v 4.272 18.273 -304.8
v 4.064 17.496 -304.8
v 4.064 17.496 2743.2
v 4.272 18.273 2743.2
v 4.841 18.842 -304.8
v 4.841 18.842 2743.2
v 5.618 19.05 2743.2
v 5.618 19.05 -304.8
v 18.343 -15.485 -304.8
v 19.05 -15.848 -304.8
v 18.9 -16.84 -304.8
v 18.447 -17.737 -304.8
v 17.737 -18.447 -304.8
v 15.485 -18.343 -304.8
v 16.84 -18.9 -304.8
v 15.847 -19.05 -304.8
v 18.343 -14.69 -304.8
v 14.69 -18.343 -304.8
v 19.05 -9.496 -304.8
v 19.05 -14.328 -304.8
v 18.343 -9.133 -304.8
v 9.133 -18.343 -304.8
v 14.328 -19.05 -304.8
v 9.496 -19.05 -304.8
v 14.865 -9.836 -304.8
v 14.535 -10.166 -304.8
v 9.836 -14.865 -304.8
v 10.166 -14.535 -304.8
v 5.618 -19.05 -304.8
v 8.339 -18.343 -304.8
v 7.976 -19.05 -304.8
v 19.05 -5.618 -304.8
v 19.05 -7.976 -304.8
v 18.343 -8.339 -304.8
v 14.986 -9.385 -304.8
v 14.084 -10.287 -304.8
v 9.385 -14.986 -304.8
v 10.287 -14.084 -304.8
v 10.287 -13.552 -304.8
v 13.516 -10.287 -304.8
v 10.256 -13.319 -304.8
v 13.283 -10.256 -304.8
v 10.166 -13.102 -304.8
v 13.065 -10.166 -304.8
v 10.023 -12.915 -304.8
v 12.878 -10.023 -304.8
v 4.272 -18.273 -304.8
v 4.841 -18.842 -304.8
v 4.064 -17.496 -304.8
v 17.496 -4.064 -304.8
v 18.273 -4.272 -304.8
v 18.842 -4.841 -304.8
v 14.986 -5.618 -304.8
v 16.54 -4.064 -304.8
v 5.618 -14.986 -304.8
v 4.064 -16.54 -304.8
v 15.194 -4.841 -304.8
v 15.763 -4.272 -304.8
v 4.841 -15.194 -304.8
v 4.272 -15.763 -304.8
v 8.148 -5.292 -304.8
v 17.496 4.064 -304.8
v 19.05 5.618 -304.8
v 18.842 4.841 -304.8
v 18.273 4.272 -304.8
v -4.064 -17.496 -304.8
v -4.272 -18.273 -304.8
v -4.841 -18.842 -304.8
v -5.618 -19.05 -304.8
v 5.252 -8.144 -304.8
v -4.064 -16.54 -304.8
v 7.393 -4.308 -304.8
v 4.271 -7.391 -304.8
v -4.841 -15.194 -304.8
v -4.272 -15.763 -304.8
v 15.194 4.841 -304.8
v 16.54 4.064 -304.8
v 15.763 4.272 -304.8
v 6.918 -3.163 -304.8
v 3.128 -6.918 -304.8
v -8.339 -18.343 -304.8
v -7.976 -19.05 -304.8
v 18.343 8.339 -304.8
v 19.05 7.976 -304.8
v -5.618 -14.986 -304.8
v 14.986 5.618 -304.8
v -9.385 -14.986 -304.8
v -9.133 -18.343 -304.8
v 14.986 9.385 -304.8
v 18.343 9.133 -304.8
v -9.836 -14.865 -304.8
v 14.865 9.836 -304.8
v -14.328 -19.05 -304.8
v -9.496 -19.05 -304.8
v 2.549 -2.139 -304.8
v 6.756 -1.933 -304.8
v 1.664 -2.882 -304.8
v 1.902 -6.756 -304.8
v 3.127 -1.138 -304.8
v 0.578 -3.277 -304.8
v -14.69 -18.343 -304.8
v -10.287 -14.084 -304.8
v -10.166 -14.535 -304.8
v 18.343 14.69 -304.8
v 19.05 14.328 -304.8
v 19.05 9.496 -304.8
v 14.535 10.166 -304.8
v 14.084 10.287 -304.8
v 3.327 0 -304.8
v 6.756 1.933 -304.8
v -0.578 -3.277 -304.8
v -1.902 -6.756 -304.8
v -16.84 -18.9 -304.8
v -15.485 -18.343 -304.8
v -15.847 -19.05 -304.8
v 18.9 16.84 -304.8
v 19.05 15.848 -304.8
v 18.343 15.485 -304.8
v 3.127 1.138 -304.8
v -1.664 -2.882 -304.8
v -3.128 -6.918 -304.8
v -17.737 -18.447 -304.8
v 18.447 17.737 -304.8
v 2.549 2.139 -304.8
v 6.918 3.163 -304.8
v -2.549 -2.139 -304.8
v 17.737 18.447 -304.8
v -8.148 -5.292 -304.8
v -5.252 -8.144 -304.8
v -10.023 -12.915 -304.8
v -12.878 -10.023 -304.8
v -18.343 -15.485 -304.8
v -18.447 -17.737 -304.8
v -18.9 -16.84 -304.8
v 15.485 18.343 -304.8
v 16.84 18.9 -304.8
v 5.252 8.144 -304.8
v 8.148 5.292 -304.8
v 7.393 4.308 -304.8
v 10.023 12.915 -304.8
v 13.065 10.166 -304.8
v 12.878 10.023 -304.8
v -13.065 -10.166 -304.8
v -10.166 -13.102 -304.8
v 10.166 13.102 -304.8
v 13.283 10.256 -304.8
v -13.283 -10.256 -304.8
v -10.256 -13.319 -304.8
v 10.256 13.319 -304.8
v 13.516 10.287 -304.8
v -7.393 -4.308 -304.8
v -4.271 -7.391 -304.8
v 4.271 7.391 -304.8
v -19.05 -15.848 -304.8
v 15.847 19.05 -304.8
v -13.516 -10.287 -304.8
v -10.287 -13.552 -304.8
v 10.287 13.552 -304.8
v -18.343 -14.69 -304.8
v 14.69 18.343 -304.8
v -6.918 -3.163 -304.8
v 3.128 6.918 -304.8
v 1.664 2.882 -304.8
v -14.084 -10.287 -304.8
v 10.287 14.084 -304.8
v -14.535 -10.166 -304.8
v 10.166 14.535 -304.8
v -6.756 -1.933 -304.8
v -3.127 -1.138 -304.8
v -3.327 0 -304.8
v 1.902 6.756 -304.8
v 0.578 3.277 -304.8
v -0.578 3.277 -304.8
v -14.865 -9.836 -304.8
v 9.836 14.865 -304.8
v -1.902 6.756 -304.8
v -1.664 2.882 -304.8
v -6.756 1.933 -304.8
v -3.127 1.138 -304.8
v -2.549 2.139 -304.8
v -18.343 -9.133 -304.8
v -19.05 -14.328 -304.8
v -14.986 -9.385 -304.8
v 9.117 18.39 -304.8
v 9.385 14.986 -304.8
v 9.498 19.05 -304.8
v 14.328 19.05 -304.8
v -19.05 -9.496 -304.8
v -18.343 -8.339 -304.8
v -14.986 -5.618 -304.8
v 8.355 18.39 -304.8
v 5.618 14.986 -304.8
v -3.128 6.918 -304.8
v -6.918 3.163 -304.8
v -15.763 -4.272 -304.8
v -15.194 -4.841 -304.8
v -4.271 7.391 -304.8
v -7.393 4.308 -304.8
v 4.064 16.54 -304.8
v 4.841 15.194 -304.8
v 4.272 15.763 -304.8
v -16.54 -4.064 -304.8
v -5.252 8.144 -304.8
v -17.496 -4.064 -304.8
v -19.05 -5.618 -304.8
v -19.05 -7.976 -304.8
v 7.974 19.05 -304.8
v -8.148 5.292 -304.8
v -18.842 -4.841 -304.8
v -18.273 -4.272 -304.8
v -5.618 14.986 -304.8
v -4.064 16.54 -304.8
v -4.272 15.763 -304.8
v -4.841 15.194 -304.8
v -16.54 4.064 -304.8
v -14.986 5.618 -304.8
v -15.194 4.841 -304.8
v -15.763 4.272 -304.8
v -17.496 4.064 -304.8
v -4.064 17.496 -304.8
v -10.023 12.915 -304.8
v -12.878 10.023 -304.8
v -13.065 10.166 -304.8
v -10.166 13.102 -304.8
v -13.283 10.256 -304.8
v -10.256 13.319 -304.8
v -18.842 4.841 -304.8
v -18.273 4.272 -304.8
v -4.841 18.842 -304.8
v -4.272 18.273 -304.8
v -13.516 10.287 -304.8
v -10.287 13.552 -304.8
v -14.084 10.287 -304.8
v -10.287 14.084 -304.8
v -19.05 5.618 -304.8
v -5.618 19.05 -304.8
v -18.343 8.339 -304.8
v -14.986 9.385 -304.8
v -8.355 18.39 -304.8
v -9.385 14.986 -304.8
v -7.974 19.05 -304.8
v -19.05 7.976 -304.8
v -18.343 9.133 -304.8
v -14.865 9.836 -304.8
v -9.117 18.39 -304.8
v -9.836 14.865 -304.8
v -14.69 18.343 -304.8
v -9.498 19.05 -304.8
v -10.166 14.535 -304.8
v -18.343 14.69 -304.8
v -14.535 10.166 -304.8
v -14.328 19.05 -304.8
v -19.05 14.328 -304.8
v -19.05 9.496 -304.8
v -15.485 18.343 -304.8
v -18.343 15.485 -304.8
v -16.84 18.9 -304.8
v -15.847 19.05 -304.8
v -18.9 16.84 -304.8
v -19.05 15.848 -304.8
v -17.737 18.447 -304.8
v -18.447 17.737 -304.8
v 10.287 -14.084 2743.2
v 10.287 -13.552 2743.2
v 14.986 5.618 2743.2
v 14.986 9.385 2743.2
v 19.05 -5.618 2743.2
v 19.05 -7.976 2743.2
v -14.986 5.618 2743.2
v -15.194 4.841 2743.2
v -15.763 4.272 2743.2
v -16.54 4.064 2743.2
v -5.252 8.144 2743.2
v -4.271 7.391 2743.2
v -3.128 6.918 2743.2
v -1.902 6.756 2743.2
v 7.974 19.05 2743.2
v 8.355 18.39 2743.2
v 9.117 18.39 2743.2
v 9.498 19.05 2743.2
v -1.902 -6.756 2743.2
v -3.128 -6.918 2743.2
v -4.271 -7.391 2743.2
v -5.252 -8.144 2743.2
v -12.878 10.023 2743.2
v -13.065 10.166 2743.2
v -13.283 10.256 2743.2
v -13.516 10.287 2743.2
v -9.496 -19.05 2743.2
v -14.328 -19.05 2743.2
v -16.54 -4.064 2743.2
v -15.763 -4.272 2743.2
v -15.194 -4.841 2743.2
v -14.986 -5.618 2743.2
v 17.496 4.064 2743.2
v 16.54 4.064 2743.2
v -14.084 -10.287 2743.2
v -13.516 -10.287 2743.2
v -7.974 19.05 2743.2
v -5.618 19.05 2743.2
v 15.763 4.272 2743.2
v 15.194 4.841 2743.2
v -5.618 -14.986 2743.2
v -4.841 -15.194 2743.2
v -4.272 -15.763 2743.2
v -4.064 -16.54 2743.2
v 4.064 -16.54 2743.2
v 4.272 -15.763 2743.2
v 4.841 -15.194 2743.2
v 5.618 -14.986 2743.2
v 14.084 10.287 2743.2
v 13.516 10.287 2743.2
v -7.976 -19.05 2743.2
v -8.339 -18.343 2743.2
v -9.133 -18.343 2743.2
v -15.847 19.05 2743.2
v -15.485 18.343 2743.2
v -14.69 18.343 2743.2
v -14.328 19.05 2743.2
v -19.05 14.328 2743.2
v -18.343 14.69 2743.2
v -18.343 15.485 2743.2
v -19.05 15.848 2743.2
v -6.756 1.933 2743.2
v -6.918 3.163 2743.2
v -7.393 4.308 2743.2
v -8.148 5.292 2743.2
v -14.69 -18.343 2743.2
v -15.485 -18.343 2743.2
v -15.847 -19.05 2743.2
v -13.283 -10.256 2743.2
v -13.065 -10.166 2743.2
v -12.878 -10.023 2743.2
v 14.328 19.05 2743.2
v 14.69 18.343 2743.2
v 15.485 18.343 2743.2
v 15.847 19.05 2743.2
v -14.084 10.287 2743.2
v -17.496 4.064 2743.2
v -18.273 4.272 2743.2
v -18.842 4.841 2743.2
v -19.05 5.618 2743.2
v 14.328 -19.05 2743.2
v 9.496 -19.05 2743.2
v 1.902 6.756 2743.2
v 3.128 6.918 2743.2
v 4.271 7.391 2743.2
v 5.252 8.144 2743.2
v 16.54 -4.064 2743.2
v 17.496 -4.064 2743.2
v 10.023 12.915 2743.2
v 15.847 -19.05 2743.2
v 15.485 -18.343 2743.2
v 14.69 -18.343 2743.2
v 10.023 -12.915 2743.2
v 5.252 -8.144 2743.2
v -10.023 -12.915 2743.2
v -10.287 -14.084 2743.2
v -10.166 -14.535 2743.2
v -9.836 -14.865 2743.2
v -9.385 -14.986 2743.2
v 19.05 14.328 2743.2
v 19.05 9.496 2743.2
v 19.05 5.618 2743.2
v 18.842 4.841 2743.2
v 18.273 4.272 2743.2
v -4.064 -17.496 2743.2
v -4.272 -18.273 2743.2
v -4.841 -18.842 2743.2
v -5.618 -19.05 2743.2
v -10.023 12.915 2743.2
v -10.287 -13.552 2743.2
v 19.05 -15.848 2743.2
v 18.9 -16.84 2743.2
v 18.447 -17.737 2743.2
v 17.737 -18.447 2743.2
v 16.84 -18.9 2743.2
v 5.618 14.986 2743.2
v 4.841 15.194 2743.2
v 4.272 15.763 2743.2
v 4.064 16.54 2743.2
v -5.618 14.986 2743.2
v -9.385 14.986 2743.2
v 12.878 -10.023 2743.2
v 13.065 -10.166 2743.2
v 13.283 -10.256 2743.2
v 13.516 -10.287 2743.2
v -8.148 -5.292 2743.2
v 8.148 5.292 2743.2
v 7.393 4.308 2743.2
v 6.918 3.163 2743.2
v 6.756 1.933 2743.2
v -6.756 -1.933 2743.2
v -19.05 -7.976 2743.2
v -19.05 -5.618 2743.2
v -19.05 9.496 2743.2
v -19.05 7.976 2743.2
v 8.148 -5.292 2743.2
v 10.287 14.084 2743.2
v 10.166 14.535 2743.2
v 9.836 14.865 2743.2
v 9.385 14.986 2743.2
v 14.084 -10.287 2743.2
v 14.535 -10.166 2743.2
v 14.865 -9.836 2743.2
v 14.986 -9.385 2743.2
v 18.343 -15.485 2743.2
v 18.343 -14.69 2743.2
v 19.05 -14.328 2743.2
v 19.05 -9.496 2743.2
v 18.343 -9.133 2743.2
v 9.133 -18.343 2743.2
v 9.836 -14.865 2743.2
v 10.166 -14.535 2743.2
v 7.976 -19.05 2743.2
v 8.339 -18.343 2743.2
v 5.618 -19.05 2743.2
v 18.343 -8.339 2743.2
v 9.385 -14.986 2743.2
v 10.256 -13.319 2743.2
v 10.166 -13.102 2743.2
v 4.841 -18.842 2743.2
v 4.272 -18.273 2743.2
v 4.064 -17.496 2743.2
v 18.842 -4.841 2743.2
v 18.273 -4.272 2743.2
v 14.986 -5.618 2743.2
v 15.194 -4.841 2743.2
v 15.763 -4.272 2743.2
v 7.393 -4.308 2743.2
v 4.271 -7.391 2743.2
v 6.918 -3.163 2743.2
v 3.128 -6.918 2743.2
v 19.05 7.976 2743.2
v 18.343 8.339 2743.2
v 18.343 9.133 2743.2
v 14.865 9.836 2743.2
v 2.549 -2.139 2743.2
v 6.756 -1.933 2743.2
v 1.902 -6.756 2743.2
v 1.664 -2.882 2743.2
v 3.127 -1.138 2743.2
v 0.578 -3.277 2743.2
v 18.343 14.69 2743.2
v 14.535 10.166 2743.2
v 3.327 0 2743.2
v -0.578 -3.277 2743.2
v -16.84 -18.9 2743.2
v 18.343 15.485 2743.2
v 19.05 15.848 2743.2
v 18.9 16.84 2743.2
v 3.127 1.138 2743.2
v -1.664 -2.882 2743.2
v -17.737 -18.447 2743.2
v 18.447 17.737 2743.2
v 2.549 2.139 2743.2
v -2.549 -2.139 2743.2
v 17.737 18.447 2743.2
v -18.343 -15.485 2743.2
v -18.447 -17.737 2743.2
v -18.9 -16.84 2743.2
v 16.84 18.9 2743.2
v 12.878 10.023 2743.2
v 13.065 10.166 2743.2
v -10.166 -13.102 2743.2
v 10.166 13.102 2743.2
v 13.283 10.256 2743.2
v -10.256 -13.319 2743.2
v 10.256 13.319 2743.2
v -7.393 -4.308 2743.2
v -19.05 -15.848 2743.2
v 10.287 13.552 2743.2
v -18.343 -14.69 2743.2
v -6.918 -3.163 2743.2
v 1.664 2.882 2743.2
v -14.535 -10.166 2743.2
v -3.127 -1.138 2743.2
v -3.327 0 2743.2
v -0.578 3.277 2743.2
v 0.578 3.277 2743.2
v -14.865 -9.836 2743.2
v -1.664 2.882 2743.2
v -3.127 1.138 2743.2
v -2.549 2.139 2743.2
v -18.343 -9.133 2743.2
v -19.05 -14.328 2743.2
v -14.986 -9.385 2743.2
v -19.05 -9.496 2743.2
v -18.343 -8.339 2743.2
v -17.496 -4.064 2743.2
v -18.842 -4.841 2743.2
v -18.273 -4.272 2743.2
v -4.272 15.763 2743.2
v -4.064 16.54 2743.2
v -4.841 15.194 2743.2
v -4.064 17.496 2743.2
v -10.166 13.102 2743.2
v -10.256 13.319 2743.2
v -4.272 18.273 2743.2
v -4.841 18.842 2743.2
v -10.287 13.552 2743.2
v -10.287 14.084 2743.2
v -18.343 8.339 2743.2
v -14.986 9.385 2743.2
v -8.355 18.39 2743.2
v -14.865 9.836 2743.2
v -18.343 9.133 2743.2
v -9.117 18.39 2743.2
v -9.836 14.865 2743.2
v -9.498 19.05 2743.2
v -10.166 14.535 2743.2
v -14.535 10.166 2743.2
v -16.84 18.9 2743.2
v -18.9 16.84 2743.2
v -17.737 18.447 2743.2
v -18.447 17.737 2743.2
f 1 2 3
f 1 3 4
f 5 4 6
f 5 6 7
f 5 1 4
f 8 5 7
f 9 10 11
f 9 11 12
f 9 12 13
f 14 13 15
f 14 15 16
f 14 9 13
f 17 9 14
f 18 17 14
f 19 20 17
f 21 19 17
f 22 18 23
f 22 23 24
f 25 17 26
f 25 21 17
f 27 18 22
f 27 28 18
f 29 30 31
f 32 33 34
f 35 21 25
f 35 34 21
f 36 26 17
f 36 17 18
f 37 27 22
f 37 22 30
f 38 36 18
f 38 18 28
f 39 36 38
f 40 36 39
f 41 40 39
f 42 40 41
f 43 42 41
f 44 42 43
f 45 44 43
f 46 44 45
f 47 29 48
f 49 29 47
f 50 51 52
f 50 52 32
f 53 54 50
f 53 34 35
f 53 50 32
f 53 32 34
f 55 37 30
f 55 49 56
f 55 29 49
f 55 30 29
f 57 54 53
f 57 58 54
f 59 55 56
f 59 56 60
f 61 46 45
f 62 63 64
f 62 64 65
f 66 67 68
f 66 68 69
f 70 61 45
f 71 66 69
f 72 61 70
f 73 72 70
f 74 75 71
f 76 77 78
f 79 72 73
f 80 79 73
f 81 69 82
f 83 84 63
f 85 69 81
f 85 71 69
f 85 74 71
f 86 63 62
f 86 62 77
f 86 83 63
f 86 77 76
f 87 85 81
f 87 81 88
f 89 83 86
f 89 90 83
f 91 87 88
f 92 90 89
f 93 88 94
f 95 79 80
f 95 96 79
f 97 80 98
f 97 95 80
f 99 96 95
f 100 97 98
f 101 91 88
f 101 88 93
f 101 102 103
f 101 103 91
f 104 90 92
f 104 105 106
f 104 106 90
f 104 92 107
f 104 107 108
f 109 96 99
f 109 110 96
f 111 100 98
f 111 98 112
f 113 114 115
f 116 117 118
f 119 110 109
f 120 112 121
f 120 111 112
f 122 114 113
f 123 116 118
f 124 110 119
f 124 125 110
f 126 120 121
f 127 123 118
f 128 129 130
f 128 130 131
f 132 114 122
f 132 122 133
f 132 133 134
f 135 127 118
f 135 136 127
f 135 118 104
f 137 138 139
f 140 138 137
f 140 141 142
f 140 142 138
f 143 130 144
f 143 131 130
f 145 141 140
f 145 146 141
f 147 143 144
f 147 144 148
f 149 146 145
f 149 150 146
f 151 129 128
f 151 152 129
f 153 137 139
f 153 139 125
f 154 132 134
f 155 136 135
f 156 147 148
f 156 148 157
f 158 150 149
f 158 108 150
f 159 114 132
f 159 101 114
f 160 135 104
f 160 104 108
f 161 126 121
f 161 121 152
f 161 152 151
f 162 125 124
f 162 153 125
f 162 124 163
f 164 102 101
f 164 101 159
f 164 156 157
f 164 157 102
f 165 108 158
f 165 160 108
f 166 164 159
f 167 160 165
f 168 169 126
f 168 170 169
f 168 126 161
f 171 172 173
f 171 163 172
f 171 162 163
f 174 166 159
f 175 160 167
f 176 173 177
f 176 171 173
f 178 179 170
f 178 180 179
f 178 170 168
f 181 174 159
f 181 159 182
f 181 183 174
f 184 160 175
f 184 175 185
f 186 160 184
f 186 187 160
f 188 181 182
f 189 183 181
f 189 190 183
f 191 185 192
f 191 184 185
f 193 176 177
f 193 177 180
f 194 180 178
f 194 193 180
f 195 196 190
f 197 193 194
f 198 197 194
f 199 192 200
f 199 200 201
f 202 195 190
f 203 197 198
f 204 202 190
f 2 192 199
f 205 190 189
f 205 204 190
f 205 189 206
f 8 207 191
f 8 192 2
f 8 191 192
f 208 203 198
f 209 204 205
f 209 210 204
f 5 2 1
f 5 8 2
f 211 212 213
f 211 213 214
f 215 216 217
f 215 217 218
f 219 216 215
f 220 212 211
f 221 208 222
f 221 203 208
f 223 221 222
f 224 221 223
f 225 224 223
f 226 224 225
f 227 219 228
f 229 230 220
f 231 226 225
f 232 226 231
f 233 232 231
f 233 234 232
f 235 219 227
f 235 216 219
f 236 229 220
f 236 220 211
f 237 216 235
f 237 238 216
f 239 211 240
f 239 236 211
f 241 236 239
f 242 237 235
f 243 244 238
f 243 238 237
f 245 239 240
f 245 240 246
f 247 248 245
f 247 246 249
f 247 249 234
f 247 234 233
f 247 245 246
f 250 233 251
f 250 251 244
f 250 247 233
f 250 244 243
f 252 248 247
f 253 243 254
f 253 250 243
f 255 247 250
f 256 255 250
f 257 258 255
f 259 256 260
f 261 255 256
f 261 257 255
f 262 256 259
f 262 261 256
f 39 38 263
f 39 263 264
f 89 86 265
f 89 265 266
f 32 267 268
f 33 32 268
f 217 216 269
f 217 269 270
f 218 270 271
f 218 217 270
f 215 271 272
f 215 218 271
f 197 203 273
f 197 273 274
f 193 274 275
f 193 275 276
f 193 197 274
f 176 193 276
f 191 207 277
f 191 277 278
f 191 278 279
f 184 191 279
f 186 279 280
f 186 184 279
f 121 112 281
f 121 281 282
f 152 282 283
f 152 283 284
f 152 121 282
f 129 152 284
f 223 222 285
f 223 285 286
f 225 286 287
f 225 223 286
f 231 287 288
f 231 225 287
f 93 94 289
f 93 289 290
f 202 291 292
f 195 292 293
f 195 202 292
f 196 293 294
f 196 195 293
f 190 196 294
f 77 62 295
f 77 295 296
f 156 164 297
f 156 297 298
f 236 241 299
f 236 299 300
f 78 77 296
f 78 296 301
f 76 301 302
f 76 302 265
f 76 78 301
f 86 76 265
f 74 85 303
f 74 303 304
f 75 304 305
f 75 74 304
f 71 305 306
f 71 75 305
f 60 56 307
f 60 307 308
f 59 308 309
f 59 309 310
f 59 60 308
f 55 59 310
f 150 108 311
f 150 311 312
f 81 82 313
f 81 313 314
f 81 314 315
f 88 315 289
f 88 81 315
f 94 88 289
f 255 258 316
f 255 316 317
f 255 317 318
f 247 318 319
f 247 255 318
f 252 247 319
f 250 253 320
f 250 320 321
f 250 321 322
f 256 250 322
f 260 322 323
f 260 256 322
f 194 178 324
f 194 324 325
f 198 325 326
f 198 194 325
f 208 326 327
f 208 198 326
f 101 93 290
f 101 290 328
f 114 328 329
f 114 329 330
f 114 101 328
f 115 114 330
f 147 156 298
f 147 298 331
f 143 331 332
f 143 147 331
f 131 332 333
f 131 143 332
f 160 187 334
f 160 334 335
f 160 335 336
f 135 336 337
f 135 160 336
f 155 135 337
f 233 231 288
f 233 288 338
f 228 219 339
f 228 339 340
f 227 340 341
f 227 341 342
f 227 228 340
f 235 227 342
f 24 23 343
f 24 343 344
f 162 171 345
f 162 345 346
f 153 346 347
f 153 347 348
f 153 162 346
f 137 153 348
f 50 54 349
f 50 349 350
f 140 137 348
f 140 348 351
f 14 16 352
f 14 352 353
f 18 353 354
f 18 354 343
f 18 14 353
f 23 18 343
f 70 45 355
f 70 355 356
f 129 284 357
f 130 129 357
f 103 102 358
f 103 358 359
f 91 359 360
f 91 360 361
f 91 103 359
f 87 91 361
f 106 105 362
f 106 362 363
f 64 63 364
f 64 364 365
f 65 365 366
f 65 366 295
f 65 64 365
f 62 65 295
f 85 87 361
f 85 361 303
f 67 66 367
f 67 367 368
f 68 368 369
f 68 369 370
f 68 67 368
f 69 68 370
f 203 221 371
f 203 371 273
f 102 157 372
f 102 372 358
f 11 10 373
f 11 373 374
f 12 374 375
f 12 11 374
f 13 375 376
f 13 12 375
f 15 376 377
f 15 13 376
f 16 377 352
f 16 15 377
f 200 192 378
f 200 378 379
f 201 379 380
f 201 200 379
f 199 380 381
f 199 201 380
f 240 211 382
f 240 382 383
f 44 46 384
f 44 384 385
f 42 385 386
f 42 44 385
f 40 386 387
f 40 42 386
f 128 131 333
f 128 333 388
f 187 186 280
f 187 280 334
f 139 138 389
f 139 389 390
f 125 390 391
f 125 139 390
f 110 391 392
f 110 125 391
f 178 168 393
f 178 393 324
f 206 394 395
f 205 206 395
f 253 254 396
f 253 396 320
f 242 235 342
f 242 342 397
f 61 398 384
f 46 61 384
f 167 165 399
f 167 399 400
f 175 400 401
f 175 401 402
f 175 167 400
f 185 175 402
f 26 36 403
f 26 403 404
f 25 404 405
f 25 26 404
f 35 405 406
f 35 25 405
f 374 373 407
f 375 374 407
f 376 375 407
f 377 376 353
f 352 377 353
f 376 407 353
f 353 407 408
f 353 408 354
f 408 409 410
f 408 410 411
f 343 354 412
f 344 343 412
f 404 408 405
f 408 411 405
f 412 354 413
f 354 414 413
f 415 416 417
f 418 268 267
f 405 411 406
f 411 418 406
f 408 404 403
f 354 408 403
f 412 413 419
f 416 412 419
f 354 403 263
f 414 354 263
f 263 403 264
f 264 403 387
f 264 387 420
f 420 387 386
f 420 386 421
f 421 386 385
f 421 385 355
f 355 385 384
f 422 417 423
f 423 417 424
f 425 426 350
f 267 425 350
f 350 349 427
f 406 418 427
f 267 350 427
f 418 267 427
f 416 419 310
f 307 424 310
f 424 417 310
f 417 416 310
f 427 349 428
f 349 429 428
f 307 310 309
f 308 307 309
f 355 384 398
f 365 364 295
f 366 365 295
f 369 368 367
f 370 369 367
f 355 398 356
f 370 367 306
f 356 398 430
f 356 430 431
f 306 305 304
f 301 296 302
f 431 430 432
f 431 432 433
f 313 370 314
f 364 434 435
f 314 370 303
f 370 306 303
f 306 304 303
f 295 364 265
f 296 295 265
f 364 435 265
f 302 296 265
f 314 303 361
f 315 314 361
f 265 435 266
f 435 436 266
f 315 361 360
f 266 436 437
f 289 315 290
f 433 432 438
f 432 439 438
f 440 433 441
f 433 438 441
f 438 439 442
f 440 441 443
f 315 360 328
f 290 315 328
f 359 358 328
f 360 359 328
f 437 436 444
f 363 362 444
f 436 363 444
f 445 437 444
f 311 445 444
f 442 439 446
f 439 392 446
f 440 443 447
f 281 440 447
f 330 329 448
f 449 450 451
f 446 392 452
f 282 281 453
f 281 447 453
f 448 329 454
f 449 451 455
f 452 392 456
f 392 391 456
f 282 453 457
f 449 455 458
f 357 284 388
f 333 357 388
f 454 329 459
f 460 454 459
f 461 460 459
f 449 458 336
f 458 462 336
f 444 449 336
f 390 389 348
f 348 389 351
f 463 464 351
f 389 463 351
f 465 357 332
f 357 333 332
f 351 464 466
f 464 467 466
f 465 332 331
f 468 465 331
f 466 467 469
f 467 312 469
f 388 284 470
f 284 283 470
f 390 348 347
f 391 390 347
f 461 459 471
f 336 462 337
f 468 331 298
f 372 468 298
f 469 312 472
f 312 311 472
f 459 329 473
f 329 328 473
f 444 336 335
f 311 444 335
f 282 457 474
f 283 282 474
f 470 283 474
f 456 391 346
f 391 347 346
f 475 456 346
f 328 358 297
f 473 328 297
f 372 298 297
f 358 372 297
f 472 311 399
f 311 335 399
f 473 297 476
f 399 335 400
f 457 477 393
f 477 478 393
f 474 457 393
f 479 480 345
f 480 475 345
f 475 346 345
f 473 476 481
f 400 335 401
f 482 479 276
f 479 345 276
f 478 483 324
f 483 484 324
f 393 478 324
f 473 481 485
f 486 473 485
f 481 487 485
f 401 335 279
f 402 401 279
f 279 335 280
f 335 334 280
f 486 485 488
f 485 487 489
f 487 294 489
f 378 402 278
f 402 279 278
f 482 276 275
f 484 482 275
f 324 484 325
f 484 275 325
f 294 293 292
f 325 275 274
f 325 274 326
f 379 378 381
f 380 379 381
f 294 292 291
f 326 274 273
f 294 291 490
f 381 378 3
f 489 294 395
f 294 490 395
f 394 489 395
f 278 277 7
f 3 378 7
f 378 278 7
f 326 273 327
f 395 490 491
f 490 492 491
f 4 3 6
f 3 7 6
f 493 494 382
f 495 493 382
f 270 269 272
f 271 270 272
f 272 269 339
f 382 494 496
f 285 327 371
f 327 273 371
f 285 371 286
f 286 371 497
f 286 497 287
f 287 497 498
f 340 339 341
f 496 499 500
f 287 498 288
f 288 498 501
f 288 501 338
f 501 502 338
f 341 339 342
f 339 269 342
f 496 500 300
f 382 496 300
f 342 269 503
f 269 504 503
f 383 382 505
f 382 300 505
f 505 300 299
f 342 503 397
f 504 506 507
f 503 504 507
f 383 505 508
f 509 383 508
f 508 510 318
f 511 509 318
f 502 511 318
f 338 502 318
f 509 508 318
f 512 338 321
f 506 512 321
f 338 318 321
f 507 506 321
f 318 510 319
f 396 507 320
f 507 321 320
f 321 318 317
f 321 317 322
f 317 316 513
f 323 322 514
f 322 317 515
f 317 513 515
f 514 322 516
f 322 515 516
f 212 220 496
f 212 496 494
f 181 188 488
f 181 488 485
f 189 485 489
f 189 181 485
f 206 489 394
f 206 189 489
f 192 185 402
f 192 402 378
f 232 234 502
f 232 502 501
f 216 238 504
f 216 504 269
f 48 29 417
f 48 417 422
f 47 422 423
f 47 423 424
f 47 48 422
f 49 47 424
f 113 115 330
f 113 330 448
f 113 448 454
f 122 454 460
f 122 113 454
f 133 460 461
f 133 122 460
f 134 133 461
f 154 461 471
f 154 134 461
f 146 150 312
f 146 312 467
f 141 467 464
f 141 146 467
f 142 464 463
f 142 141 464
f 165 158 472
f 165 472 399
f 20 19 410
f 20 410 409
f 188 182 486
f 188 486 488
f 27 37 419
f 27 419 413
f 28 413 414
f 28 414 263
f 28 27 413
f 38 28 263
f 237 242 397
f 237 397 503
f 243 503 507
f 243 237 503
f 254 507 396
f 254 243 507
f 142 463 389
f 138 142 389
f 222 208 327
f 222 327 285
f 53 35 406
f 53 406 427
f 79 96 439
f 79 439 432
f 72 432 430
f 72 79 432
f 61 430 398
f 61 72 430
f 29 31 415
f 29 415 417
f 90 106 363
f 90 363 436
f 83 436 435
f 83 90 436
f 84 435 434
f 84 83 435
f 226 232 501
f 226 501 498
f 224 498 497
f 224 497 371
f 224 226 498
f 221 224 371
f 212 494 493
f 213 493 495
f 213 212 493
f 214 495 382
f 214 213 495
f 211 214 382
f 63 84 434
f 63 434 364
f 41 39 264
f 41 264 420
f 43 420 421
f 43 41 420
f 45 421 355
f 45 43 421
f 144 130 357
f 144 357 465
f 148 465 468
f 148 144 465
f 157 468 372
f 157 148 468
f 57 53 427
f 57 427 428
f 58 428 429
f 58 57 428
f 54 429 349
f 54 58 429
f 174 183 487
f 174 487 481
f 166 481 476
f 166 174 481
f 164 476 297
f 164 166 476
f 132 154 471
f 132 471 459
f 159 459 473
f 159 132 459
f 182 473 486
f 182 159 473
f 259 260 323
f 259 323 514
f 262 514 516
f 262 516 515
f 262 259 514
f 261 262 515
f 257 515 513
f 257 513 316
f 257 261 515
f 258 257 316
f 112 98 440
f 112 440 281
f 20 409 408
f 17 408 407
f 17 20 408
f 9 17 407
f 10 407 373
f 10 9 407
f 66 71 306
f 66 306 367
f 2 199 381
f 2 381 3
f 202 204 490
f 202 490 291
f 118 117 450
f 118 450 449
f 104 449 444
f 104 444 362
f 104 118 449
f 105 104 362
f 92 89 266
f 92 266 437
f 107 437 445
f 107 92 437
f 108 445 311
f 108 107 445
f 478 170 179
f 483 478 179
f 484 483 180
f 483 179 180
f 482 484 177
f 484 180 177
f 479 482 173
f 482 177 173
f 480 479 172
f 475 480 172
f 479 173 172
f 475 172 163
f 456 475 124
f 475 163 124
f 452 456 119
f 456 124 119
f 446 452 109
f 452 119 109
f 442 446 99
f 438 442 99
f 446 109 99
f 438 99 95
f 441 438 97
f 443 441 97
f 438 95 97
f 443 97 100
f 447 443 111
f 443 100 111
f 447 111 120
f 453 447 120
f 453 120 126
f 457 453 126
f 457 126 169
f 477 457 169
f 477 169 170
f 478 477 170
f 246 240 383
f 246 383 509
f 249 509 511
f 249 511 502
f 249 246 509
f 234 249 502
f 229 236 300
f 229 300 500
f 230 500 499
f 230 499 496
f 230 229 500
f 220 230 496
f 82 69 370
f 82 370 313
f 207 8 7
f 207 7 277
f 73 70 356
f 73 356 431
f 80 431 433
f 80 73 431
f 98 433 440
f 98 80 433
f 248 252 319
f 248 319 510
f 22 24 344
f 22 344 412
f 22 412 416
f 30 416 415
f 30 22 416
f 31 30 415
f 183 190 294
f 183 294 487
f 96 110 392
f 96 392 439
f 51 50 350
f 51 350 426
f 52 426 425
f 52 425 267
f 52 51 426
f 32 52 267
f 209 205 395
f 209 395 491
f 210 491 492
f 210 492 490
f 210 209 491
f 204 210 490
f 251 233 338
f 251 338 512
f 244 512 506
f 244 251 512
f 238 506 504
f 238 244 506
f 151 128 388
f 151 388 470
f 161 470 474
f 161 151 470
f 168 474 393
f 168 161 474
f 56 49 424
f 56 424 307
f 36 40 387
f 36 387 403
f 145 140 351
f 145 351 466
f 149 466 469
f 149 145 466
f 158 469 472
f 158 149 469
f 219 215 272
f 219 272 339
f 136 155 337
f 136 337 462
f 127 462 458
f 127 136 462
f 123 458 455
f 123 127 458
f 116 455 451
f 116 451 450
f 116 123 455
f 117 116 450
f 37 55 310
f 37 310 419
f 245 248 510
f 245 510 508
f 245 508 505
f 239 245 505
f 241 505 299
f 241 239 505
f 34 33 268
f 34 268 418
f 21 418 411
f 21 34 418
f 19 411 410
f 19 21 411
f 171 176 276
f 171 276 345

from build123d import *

# Parameters (mm, degrees)
SKETCH1_R           = 3.3274
BOSS_EXTRUDE1_DEPTH = 3048


with BuildPart() as part:
    # Sketch1 → Boss-Extrude1 (new body)
    with BuildSketch(Plane(origin=(0, 0, -304.8), x_dir=(-1, 0, 0), z_dir=(0, 0, -1))):
        with BuildLine():
            Line((14.327719208, 19.05), (9.498178705, 19.05))
            ThreePointArc((9.498178705, 19.05), (8.736178705, 18.288), (7.974178705, 19.05))
            Line((7.974178705, 19.05), (5.617617549, 19.05))
            ThreePointArc((5.617617549, 19.05), (4.519044045, 18.594955955), (4.064000001, 17.496382451))
            Line((4.064000001, 17.496382451), (4.064000001, 16.539617547))
            ThreePointArc((4.064000001, 16.539617547), (4.519044045, 15.441044043), (5.617617549, 14.985999999))
            Line((5.617617549, 14.985999999), (9.3853, 14.985999999))
            ThreePointArc((9.3853, 14.985999999), (10.022898185, 14.721898183), (10.287, 14.084299999))
            Line((10.287, 14.084299999), (10.287, 13.552357129))
            ThreePointArc((10.287, 13.552357129), (10.218362387, 13.207291991), (10.022898969, 12.914759729))
            Line((10.022898969, 12.914759729), (5.252158108, 8.144007131))
            ThreePointArc((5.252158108, 8.144007131), (3.715177374, 7.117027387), (1.902183977, 6.756399998))
            Line((1.902183977, 6.756399998), (-1.902183975, 6.756399998))
            ThreePointArc((-1.902183975, 6.756399998), (-3.715177372, 7.117027386), (-5.252158105, 8.14400713))
            Line((-5.252158105, 8.14400713), (-10.022898969, 12.914759729))
            ThreePointArc((-10.022898969, 12.914759729), (-10.218362387, 13.207291991), (-10.287, 13.55235713))
            Line((-10.287, 13.55235713), (-10.287, 14.084299999))
            ThreePointArc((-10.287, 14.084299999), (-10.022898185, 14.721898183), (-9.3853, 14.985999999))
            Line((-9.3853, 14.985999999), (-5.617617549, 14.985999999))
            ThreePointArc((-5.617617549, 14.985999999), (-4.519044045, 15.441044043), (-4.064000001, 16.539617547))
            Line((-4.064000001, 16.539617547), (-4.064000001, 17.496382451))
            ThreePointArc((-4.064000001, 17.496382451), (-4.519044045, 18.594955955), (-5.617617549, 19.05))
            Line((-5.617617549, 19.05), (-7.974178702, 19.05))
            ThreePointArc((-7.974178702, 19.05), (-8.736178702, 18.288), (-9.498178702, 19.05))
            Line((-9.498178702, 19.05), (-14.327719206, 19.05))
            ThreePointArc((-14.327719206, 19.05), (-15.087603121, 18.231251132), (-15.847487038, 19.05))
            ThreePointArc((-15.847487038, 19.05), (-18.120176287, 18.120192083), (-19.049999998, 15.847509295))
            ThreePointArc((-19.049999998, 15.847509295), (-18.23125099, 15.087625389), (-19.05, 14.327741484))
            Line((-19.05, 14.327741484), (-19.05, 9.49609147))
            ThreePointArc((-19.05, 9.49609147), (-18.23125099, 8.736207564), (-19.05, 7.976323659))
            Line((-19.05, 7.976323659), (-19.05, 5.617617549))
            ThreePointArc((-19.05, 5.617617549), (-18.594955955, 4.519044045), (-17.496382451, 4.064000001))
            Line((-17.496382451, 4.064000001), (-16.53961755, 4.064000001))
            ThreePointArc((-16.53961755, 4.064000001), (-15.441044046, 4.519044045), (-14.986000001, 5.617617549))
            Line((-14.986000001, 5.617617549), (-14.986000001, 9.385342517))
            ThreePointArc((-14.986000001, 9.385342517), (-14.721898186, 10.022940702), (-14.084300001, 10.287042517))
            Line((-14.084300001, 10.287042517), (-13.516042087, 10.287042517))
            ThreePointArc((-13.516042087, 10.287042517), (-13.170975923, 10.218404479), (-12.878443118, 10.022939917))
            Line((-12.878443118, 10.022939917), (-8.147580081, 5.292065242))
            ThreePointArc((-8.147580081, 5.292065242), (-7.11795588, 3.751120652), (-6.756400001, 1.933453584))
            Line((-6.756400001, 1.933453584), (-6.756400001, -1.933453584))
            ThreePointArc((-6.756400001, -1.933453584), (-7.11795588, -3.751120652), (-8.147580081, -5.292065242))
            Line((-8.147580081, -5.292065242), (-12.878443118, -10.022939917))
            ThreePointArc((-12.878443118, -10.022939917), (-13.170975923, -10.218404479), (-13.516042087, -10.287042517))
            Line((-13.516042087, -10.287042517), (-14.084300001, -10.287042517))
            ThreePointArc((-14.084300001, -10.287042517), (-14.721898186, -10.022940702), (-14.986000001, -9.385342517))
            Line((-14.986000001, -9.385342517), (-14.986000001, -5.617617549))
            ThreePointArc((-14.986000001, -5.617617549), (-15.441044046, -4.519044045), (-16.53961755, -4.064000001))
            Line((-16.53961755, -4.064000001), (-17.496382451, -4.064000001))
            ThreePointArc((-17.496382451, -4.064000001), (-18.594955955, -4.519044045), (-19.05, -5.617617549))
            Line((-19.05, -5.617617549), (-19.05, -7.97631849))
            ThreePointArc((-19.05, -7.97631849), (-18.23125099, -8.736202395), (-19.05, -9.496086301))
            Line((-19.05, -9.496086301), (-19.05, -14.327742909))
            ThreePointArc((-19.05, -14.327742909), (-18.23125099, -15.087626814), (-19.049999998, -15.84751072))
            ThreePointArc((-19.049999998, -15.84751072), (-18.120175716, -18.120192644), (-15.847486868, -19.050000001))
            ThreePointArc((-15.847486868, -19.050000001), (-15.087602952, -18.231251132), (-14.327719035, -19.05))
            Line((-14.327719035, -19.05), (-9.496062448, -19.05))
            ThreePointArc((-9.496062448, -19.05), (-8.736178532, -18.231251132), (-7.976294616, -19.05))
            Line((-7.976294616, -19.05), (-5.617617549, -19.05))
            ThreePointArc((-5.617617549, -19.05), (-4.519044045, -18.594955955), (-4.064000001, -17.496382451))
            Line((-4.064000001, -17.496382451), (-4.064000001, -16.53961755))
            ThreePointArc((-4.064000001, -16.53961755), (-4.519044045, -15.441044046), (-5.617617549, -14.986000001))
            Line((-5.617617549, -14.986000001), (-9.3853, -14.986000001))
            ThreePointArc((-9.3853, -14.986000001), (-10.022898185, -14.721898186), (-10.287, -14.084300001))
            Line((-10.287, -14.084300001), (-10.287, -13.552357132))
            ThreePointArc((-10.287, -13.552357132), (-10.218362387, -13.207291994), (-10.022898969, -12.914759732))
            Line((-10.022898969, -12.914759732), (-5.252158104, -8.144007133))
            ThreePointArc((-5.252158104, -8.144007133), (-3.715177371, -7.117027389), (-1.902183975, -6.756400001))
            Line((-1.902183975, -6.756400001), (1.902183978, -6.756400001))
            ThreePointArc((1.902183978, -6.756400001), (3.715177375, -7.117027389), (5.252158109, -8.144007134))
            Line((5.252158109, -8.144007134), (10.022898969, -12.914759732))
            ThreePointArc((10.022898969, -12.914759732), (10.218362387, -13.207291994), (10.287, -13.552357133))
            Line((10.287, -13.552357133), (10.287, -14.084300001))
            ThreePointArc((10.287, -14.084300001), (10.022898185, -14.721898186), (9.3853, -14.986000001))
            Line((9.3853, -14.986000001), (5.617617549, -14.986000001))
            ThreePointArc((5.617617549, -14.986000001), (4.519044045, -15.441044046), (4.064000001, -16.53961755))
            Line((4.064000001, -16.53961755), (4.064000001, -17.496382451))
            ThreePointArc((4.064000001, -17.496382451), (4.519044045, -18.594955955), (5.617617549, -19.05))
            Line((5.617617549, -19.05), (7.976294616, -19.05))
            ThreePointArc((7.976294616, -19.05), (8.736178532, -18.231251132), (9.496062448, -19.05))
            Line((9.496062448, -19.05), (14.327719035, -19.05))
            ThreePointArc((14.327719035, -19.05), (15.087602952, -18.231251132), (15.847486868, -19.050000001))
            ThreePointArc((15.847486868, -19.050000001), (18.120175717, -18.120192645), (19.050000001, -15.84751072))
            ThreePointArc((19.050000001, -15.84751072), (18.231250992, -15.087626816), (19.049999999, -14.327742909))
            Line((19.049999999, -14.327742909), (19.049999999, -9.496086301))
            ThreePointArc((19.049999999, -9.496086301), (18.231250991, -8.736202395), (19.049999999, -7.97631849))
            Line((19.049999999, -7.97631849), (19.049999999, -5.617617549))
            ThreePointArc((19.049999999, -5.617617549), (18.594955954, -4.519044045), (17.49638245, -4.064000001))
            Line((17.49638245, -4.064000001), (16.539617547, -4.064000001))
            ThreePointArc((16.539617547, -4.064000001), (15.441044043, -4.519044045), (14.985999999, -5.617617549))
            Line((14.985999999, -5.617617549), (14.985999999, -9.385342517))
            ThreePointArc((14.985999999, -9.385342517), (14.721898183, -10.022940702), (14.084299999, -10.287042517))
            Line((14.084299999, -10.287042517), (13.516042087, -10.287042517))
            ThreePointArc((13.516042087, -10.287042517), (13.170975924, -10.218404479), (12.878443118, -10.022939918))
            Line((12.878443118, -10.022939918), (8.147580079, -5.292065243))
            ThreePointArc((8.147580079, -5.292065243), (7.117955878, -3.751120653), (6.756399999, -1.933453584))
            Line((6.756399999, -1.933453584), (6.756399999, 1.933453584))
            ThreePointArc((6.756399999, 1.933453584), (7.117955878, 3.751120653), (8.147580079, 5.292065243))
            Line((8.147580079, 5.292065243), (12.878443118, 10.022939918))
            ThreePointArc((12.878443118, 10.022939918), (13.170975924, 10.218404479), (13.516042087, 10.287042517))
            Line((13.516042087, 10.287042517), (14.084299999, 10.287042517))
            ThreePointArc((14.084299999, 10.287042517), (14.721898183, 10.022940702), (14.985999999, 9.385342517))
            Line((14.985999999, 9.385342517), (14.985999999, 5.617617549))
            ThreePointArc((14.985999999, 5.617617549), (15.441044043, 4.519044045), (16.539617547, 4.064000001))
            Line((16.539617547, 4.064000001), (17.49638245, 4.064000001))
            ThreePointArc((17.49638245, 4.064000001), (18.594955954, 4.519044045), (19.049999999, 5.617617549))
            Line((19.049999999, 5.617617549), (19.049999999, 7.976323659))
            ThreePointArc((19.049999999, 7.976323659), (18.231250991, 8.736207564), (19.049999999, 9.49609147))
            Line((19.049999999, 9.49609147), (19.049999999, 14.327741484))
            ThreePointArc((19.049999999, 14.327741484), (18.231250992, 15.087625391), (19.050000001, 15.847509295))
            ThreePointArc((19.050000001, 15.847509295), (18.12017629, 18.120192083), (15.84748704, 19.05))
            ThreePointArc((15.84748704, 19.05), (15.087603124, 18.231251132), (14.327719208, 19.05))
        make_face()
        Circle(SKETCH1_R, mode=Mode.SUBTRACT)
    extrude(amount=-BOSS_EXTRUDE1_DEPTH)


solid = part.part
